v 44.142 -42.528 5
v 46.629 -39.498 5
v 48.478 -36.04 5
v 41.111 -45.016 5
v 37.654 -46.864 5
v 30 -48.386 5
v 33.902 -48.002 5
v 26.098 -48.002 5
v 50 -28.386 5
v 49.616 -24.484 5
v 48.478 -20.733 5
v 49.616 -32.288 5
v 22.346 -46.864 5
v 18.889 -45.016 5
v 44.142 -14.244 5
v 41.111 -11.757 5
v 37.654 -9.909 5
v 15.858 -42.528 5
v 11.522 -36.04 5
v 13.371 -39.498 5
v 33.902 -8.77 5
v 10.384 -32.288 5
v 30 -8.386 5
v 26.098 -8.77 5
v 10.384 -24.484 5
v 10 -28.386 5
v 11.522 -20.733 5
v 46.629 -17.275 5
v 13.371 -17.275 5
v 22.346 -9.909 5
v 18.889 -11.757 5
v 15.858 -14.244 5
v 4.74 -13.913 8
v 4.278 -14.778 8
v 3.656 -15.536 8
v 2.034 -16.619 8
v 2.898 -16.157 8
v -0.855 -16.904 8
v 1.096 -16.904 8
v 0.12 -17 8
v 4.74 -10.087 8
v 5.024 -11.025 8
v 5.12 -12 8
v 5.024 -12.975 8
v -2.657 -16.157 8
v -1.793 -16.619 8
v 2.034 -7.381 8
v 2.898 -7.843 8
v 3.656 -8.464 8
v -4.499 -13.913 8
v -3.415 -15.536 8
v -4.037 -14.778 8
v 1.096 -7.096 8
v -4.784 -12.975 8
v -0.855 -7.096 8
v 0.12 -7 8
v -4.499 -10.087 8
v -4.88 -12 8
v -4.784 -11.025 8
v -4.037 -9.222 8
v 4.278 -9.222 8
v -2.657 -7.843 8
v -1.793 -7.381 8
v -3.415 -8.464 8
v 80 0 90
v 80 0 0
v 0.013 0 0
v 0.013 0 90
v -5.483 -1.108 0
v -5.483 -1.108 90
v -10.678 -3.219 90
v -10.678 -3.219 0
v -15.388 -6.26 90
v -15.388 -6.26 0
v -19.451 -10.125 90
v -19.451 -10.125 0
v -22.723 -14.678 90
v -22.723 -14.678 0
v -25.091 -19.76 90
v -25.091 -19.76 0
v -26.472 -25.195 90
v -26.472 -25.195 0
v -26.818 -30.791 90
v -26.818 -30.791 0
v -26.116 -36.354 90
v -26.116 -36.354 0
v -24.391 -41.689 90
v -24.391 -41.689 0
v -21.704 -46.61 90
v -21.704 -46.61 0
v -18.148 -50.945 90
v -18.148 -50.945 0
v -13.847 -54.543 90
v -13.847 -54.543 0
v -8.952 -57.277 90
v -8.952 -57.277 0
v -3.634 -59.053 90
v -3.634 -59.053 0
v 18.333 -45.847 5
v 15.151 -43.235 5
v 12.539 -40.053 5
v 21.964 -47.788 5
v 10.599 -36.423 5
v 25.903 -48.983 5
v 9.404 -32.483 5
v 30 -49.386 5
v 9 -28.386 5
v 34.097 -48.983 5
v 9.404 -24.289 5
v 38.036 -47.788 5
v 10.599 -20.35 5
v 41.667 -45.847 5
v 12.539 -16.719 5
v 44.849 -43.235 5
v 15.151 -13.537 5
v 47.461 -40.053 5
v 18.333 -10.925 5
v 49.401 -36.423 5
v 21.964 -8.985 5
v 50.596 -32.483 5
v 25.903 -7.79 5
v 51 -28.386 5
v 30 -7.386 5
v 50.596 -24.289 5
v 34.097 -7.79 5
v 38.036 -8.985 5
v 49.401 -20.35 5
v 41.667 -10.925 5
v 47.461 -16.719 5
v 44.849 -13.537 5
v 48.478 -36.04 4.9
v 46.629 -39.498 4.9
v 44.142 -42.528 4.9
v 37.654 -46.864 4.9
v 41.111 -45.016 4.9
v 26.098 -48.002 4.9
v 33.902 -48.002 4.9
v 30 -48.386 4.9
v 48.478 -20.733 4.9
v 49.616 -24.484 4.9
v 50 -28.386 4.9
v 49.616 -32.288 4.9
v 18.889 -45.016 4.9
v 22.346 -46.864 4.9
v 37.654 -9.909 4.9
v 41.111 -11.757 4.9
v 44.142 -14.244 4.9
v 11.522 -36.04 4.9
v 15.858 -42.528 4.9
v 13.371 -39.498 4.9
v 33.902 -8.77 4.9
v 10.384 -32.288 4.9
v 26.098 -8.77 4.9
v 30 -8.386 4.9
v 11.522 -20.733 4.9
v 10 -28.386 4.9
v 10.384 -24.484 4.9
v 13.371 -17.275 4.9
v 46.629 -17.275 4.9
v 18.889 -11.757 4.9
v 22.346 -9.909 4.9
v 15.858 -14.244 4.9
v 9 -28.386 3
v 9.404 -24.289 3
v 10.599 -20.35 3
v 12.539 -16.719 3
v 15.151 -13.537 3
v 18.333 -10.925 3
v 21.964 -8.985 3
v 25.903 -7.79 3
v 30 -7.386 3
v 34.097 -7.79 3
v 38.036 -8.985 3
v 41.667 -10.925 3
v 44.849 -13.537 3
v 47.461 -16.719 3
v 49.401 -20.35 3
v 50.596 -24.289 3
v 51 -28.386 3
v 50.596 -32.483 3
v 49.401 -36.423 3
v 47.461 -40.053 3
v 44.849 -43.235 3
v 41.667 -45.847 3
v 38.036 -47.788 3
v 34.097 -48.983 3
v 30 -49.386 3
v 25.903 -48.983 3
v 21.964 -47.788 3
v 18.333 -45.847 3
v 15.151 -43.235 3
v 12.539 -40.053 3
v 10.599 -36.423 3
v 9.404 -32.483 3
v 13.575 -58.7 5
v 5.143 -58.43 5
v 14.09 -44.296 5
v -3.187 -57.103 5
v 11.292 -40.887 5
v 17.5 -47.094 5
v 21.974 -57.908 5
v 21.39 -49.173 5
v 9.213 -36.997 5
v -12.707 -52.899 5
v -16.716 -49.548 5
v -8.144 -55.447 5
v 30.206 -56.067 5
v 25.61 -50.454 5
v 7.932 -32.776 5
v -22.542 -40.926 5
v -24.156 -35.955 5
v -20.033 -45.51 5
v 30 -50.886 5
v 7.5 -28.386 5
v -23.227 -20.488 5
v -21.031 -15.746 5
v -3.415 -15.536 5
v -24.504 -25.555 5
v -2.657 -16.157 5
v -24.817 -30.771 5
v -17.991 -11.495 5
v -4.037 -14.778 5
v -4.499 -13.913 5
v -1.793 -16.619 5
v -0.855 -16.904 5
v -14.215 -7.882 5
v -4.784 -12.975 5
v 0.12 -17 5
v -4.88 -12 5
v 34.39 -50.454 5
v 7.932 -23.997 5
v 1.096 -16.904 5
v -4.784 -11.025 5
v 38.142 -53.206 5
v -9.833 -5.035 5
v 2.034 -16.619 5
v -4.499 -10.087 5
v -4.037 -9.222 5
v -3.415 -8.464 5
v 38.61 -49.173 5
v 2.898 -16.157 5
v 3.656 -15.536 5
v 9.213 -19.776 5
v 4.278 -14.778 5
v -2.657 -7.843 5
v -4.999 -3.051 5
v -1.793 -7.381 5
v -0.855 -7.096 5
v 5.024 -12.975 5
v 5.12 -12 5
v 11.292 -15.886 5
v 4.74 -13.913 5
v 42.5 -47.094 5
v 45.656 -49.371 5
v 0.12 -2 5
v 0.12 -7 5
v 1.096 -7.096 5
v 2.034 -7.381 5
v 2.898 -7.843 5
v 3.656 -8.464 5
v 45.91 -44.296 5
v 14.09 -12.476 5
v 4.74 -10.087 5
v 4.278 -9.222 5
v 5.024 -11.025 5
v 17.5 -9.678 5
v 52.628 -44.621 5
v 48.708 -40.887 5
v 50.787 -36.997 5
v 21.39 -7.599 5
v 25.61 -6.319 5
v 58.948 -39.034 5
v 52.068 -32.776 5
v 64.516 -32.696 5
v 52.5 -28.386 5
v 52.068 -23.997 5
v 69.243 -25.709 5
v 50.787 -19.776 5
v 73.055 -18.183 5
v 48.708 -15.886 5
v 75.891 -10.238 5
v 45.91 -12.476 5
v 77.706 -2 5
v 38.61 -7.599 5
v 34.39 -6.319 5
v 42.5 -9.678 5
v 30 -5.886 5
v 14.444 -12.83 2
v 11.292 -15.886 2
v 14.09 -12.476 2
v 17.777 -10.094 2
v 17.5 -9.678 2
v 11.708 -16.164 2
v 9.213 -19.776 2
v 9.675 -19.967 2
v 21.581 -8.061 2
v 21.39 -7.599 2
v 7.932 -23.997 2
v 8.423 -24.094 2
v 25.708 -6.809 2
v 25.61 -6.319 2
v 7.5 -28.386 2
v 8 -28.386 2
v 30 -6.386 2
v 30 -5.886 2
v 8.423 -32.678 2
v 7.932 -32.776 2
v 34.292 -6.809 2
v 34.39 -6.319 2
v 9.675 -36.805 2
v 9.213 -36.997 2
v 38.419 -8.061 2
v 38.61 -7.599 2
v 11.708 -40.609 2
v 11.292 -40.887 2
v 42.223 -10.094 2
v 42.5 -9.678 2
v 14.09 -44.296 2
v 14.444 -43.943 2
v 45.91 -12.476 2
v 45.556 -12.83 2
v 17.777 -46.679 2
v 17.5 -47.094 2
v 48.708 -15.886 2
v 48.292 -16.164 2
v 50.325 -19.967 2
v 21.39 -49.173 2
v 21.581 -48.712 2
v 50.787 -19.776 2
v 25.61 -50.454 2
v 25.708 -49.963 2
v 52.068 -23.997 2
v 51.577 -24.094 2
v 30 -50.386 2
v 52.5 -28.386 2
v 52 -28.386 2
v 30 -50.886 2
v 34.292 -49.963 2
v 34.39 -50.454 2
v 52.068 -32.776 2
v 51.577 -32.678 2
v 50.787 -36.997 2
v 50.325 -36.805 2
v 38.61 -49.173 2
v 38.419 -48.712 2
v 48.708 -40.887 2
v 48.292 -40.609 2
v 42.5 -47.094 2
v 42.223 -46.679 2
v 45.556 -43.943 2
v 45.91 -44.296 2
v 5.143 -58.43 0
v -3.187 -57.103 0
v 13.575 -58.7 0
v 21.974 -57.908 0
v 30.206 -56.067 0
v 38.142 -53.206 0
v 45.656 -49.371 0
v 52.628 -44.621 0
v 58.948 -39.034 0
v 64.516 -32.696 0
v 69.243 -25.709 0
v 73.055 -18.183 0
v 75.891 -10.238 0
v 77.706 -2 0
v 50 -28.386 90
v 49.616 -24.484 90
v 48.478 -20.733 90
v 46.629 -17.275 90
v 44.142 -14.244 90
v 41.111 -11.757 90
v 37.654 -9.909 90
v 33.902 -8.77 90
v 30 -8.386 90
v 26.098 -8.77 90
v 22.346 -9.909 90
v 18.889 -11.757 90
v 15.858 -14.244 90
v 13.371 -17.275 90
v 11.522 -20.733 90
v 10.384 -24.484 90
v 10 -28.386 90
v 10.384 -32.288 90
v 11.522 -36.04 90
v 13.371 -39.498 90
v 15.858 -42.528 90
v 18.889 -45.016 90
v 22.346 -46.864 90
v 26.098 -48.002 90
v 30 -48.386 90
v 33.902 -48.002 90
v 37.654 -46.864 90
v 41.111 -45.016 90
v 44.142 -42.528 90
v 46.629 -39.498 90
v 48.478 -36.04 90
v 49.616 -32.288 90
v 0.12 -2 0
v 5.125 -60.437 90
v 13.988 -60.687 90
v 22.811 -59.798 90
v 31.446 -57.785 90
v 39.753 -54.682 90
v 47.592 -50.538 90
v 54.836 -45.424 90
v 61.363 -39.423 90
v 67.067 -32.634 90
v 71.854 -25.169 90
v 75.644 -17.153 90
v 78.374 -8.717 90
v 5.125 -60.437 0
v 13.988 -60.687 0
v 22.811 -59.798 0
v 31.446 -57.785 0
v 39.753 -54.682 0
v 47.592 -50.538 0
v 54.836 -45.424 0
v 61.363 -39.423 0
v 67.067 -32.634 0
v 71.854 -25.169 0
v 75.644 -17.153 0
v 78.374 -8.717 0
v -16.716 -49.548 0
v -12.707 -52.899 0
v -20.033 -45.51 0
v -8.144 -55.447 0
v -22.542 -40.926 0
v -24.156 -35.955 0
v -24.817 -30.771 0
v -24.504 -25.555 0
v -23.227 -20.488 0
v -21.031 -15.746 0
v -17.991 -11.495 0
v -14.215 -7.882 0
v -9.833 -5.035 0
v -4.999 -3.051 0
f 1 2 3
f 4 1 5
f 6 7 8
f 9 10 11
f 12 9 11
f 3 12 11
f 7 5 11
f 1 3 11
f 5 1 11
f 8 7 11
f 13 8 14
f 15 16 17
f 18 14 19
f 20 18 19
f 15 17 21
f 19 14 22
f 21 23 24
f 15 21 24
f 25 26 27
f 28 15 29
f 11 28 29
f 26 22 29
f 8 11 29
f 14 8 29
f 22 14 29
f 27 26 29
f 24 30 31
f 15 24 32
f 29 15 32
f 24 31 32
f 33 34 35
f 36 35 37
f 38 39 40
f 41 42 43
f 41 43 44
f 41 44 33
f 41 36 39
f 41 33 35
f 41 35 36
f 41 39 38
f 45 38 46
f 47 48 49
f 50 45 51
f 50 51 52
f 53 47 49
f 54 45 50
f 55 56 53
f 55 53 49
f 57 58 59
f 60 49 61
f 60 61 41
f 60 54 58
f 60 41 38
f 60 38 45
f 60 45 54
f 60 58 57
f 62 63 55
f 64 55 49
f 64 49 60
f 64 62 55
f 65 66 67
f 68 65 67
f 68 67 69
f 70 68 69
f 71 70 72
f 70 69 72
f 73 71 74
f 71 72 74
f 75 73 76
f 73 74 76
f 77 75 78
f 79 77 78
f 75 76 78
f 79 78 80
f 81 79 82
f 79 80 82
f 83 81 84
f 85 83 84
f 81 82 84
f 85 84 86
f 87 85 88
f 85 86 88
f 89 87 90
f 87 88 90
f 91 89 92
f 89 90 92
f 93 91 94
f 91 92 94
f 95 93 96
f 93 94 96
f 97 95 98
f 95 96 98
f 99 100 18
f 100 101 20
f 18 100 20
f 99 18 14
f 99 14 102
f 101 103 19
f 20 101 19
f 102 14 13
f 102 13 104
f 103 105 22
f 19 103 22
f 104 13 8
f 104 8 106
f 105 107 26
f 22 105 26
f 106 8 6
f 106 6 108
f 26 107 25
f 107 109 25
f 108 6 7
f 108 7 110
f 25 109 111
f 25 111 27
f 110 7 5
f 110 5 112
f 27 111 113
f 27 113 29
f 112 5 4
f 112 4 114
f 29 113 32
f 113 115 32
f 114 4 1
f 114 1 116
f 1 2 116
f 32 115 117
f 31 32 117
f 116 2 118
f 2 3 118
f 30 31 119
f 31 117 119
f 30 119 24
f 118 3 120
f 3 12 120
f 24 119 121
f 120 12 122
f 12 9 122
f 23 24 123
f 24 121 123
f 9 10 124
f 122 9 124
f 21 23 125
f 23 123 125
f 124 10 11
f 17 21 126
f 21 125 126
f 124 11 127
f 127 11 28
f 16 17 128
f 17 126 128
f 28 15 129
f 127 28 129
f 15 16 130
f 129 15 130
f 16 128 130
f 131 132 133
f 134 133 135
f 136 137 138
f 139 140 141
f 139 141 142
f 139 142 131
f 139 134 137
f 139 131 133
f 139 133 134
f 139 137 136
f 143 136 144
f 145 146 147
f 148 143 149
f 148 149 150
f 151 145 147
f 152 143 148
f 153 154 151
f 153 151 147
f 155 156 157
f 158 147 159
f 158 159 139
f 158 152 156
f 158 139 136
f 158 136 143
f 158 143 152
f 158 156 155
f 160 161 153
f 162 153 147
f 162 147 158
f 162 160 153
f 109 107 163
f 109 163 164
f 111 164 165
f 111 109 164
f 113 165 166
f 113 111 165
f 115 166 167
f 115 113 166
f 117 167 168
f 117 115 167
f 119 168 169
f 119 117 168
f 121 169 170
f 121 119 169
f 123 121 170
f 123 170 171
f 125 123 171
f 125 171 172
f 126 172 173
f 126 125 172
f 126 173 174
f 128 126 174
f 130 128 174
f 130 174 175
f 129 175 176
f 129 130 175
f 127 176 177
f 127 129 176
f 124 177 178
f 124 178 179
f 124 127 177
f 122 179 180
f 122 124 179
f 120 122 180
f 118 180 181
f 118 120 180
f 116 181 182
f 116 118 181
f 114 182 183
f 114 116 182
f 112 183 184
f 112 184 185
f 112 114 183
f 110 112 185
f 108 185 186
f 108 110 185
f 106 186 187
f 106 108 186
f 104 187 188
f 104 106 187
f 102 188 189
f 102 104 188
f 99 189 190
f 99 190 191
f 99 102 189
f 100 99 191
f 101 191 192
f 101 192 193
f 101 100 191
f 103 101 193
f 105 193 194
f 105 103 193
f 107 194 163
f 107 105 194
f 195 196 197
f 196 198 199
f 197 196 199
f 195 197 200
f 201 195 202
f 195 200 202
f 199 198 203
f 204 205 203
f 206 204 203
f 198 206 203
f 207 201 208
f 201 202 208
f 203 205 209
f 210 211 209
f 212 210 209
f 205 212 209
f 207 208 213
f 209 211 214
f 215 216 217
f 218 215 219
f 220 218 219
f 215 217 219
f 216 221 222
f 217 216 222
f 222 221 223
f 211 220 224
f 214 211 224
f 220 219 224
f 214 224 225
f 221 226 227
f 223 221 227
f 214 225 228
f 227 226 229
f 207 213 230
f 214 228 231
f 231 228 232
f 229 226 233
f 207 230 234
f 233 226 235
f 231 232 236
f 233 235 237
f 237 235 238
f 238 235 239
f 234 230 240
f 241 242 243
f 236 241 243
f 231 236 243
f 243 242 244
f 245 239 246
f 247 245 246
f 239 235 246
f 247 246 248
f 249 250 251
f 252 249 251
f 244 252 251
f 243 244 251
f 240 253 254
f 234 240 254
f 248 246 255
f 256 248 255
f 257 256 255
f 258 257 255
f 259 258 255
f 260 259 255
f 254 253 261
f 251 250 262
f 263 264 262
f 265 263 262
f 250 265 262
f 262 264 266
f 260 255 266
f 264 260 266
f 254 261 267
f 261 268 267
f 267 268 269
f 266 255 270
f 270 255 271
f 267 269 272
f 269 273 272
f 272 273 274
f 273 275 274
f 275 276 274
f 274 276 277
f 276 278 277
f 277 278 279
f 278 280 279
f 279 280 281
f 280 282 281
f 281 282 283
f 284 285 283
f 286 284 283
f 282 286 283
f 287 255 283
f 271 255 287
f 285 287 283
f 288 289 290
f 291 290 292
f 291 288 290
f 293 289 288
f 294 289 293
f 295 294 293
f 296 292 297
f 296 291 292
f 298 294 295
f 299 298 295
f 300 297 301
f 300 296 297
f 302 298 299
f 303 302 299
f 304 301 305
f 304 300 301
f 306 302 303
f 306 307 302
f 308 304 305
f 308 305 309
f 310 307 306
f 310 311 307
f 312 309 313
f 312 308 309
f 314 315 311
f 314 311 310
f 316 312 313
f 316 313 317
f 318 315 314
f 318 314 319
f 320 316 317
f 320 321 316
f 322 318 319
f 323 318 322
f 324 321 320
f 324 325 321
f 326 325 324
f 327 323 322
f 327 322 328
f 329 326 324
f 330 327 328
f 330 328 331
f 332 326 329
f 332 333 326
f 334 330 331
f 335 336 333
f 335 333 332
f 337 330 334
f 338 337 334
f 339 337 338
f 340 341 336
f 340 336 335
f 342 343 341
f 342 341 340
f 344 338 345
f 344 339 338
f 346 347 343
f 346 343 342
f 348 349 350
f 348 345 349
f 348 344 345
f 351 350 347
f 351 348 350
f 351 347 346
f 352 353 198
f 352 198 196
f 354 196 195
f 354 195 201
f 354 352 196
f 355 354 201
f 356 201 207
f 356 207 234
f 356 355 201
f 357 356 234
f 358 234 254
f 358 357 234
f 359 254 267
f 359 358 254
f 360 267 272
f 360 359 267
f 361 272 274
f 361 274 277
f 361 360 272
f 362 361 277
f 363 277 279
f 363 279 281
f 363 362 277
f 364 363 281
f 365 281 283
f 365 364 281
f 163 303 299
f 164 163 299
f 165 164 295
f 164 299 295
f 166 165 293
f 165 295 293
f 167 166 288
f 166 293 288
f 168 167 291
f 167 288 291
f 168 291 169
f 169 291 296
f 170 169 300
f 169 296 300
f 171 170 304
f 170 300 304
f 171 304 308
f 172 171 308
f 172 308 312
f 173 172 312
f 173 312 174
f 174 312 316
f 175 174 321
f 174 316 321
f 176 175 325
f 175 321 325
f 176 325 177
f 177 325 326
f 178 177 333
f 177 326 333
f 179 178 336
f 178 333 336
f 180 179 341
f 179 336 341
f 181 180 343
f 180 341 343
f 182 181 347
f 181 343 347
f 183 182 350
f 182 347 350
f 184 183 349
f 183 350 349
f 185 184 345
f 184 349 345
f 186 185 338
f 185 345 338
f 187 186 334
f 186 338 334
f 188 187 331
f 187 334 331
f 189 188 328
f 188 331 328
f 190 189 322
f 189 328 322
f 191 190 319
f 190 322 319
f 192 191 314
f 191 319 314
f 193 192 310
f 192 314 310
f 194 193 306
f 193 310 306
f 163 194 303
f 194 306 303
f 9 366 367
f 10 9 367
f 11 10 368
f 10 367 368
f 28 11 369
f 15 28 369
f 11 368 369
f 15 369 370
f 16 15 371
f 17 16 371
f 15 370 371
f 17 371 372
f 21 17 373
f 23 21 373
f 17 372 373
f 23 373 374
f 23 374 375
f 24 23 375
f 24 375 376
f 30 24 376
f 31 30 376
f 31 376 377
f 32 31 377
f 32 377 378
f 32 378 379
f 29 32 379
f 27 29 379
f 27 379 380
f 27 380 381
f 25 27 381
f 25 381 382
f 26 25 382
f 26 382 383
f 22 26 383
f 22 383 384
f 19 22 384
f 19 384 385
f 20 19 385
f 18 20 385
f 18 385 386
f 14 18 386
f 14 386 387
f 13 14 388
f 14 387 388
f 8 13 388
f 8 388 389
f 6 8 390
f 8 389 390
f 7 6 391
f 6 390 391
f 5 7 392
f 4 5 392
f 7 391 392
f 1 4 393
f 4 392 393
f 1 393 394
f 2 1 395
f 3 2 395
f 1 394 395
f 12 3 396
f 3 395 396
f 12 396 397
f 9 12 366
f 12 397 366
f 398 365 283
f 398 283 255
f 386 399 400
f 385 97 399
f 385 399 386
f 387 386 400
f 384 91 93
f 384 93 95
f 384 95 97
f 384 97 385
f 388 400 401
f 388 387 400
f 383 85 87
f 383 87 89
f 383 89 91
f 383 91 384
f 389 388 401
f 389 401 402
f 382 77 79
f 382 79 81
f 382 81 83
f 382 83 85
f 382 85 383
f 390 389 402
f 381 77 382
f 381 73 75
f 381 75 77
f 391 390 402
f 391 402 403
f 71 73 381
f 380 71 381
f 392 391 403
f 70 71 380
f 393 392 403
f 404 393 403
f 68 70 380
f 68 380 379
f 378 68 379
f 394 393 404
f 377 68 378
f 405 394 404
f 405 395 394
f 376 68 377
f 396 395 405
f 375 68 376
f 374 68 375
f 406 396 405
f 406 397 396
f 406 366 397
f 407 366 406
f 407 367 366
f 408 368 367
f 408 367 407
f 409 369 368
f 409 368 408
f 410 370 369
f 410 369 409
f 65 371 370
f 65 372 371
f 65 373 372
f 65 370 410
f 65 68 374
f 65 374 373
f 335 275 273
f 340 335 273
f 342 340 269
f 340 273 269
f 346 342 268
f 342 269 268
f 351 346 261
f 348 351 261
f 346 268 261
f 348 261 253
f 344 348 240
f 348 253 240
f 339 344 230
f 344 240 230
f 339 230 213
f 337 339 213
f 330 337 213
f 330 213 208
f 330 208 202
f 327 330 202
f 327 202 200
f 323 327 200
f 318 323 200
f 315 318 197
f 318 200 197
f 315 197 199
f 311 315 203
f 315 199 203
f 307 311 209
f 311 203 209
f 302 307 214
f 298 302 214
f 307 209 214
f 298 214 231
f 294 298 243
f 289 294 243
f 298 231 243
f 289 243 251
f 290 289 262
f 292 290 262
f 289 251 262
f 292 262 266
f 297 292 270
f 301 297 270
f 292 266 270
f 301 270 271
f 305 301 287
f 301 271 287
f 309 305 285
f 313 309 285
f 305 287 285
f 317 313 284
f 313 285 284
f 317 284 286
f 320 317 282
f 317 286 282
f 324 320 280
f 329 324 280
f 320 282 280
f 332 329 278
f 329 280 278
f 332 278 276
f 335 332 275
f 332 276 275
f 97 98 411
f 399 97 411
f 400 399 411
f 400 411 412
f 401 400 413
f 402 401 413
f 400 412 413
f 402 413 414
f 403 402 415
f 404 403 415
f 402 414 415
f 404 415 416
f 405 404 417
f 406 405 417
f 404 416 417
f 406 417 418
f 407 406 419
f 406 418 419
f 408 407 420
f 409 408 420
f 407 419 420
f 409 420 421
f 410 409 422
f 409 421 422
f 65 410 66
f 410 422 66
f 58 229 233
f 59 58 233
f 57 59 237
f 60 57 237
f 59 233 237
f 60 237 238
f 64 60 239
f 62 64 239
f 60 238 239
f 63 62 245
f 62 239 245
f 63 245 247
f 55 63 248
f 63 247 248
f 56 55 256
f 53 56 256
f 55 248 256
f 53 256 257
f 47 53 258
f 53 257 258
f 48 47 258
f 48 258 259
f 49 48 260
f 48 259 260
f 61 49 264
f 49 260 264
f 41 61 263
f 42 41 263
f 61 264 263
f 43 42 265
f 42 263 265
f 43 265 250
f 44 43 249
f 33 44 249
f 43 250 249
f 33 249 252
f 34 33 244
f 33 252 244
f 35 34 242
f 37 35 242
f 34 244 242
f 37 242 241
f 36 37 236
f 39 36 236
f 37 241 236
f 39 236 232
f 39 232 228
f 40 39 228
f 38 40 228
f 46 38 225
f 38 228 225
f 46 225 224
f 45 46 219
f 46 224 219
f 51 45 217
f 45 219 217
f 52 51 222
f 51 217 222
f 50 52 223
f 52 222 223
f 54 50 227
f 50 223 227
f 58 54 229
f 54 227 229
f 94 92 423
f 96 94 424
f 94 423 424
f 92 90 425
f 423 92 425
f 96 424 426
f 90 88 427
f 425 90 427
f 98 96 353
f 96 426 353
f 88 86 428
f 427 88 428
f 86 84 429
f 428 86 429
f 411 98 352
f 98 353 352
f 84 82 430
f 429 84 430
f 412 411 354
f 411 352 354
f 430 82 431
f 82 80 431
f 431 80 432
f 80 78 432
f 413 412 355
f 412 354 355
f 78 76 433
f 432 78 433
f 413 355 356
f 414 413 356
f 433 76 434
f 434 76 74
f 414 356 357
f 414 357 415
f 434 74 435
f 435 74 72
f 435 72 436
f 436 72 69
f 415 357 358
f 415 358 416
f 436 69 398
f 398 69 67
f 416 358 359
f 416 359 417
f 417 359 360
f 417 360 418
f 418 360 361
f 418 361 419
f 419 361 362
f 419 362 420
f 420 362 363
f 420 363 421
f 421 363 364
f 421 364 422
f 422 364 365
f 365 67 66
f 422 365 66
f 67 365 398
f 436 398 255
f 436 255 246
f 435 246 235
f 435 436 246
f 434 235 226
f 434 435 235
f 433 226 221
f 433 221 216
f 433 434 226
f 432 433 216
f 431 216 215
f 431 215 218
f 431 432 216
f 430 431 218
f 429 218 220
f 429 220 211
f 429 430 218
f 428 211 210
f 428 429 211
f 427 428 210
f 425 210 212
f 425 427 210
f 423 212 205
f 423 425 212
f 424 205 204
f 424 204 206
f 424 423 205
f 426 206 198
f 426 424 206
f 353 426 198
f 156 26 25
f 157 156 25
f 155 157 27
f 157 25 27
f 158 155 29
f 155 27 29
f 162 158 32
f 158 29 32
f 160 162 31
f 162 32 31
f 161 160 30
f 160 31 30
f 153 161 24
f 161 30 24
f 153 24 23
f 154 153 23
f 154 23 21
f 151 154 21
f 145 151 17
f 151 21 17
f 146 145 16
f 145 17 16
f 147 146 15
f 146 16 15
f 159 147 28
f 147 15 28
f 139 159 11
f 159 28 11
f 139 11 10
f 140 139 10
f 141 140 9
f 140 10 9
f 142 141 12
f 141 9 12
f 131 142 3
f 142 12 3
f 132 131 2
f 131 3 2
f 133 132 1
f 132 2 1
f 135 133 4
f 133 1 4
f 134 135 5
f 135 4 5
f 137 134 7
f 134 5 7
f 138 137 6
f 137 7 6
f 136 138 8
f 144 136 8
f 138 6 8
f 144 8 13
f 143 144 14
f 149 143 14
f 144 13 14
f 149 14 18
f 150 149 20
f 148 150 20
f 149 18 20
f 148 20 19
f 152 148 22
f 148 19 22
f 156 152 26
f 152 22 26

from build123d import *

# Parameters (mm, degrees)
BOSS_EXTRUDE1_DEPTH = 90
SHELL2_DEPTH        = 5
SKETCH4_R           = 20
CUT_EXTRUDE4_DEPTH  = 135.864371832
SKETCH5_R           = 22.5
SKETCH5_R_2         = 21
BOSS_EXTRUDE2_DEPTH = 3
CHAMFER1_SIZE       = 1
SKETCH6_R           = 20
BOSS_EXTRUDE3_DEPTH = 0.1
SKETCH7_R           = 5
CUT_EXTRUDE5_DEPTH  = 3


# Read off the part's stored shape, not the designer's step: Shell2
with BuildPart() as part:
    # Sketch2 → Boss-Extrude1 (new body)
    with BuildSketch(Plane.XY):
        with BuildLine():
            Line((80, 0), (0.013180824, 0))
            ThreePointArc((0.013180824, 0), (-26.775893479, -27.984672667), (-3.633537016, -59.052787248))
            ThreePointArc((-3.633537016, -59.052787248), (51.296073621, -48.097462301), (80, 0))
        make_face()
    extrude(amount=BOSS_EXTRUDE1_DEPTH)

    # Shell2 outline → Shell2 (cut)
    with BuildSketch(Plane.XY):
        with BuildLine():
            ThreePointArc((-3.187485366, -57.103146645), (49.216728462, -47.10575528), (77.70567898, -2))
            Line((77.70567898, -2), (0.120425847, -2))
            ThreePointArc((0.120425847, -2), (-24.782616289, -28.155901411), (-3.187485366, -57.103146645))
        make_face()
    extrude(amount=SHELL2_DEPTH, mode=Mode.SUBTRACT)

    # Sketch4 → Cut-Extrude4 (cut, through all)
    with BuildSketch(Plane.XY.offset(90)):
        with Locations((30, -28.386179716)):
            Circle(SKETCH4_R)
    extrude(amount=-CUT_EXTRUDE4_DEPTH, mode=Mode.SUBTRACT)

    # Sketch5 → Boss-Extrude2 (add)
    with BuildSketch(Plane(origin=(0, 0, 5), x_dir=(-1, 0, 0), z_dir=(0, 0, -1))):
        with Locations(Location((-30, -28.386179716, 0), (0, 0, 180))):
            Circle(SKETCH5_R)
        with Locations((-30, -28.386179716)):
            Circle(SKETCH5_R_2, mode=Mode.SUBTRACT)
    extrude(amount=BOSS_EXTRUDE2_DEPTH)

    # Chamfer1
    chamfer1_edges = [part.edges().sort_by_distance(p)[0] for p in [
        (51, -28.386179716, 2),
    ]]
    chamfer(chamfer1_edges, length=CHAMFER1_SIZE)

    # Sketch7 → Cut-Extrude5 (cut)
    with BuildSketch(Plane(origin=(0, 0, 5), x_dir=(-1, 0, 0), z_dir=(0, 0, -1))):
        with Locations((-0.120425847, -12)):
            Circle(SKETCH7_R)
    extrude(amount=-CUT_EXTRUDE5_DEPTH, mode=Mode.SUBTRACT)


with BuildPart() as body_2:
    # Sketch6 → Boss-Extrude3 (new body)
    with BuildSketch(Plane(origin=(0, 0, 5), x_dir=(-1, 0, 0), z_dir=(0, 0, -1))):
        with Locations((-30, -28.386179716)):
            Circle(SKETCH6_R)
    extrude(amount=BOSS_EXTRUDE3_DEPTH)


solid = Compound([part.part, body_2.part])
